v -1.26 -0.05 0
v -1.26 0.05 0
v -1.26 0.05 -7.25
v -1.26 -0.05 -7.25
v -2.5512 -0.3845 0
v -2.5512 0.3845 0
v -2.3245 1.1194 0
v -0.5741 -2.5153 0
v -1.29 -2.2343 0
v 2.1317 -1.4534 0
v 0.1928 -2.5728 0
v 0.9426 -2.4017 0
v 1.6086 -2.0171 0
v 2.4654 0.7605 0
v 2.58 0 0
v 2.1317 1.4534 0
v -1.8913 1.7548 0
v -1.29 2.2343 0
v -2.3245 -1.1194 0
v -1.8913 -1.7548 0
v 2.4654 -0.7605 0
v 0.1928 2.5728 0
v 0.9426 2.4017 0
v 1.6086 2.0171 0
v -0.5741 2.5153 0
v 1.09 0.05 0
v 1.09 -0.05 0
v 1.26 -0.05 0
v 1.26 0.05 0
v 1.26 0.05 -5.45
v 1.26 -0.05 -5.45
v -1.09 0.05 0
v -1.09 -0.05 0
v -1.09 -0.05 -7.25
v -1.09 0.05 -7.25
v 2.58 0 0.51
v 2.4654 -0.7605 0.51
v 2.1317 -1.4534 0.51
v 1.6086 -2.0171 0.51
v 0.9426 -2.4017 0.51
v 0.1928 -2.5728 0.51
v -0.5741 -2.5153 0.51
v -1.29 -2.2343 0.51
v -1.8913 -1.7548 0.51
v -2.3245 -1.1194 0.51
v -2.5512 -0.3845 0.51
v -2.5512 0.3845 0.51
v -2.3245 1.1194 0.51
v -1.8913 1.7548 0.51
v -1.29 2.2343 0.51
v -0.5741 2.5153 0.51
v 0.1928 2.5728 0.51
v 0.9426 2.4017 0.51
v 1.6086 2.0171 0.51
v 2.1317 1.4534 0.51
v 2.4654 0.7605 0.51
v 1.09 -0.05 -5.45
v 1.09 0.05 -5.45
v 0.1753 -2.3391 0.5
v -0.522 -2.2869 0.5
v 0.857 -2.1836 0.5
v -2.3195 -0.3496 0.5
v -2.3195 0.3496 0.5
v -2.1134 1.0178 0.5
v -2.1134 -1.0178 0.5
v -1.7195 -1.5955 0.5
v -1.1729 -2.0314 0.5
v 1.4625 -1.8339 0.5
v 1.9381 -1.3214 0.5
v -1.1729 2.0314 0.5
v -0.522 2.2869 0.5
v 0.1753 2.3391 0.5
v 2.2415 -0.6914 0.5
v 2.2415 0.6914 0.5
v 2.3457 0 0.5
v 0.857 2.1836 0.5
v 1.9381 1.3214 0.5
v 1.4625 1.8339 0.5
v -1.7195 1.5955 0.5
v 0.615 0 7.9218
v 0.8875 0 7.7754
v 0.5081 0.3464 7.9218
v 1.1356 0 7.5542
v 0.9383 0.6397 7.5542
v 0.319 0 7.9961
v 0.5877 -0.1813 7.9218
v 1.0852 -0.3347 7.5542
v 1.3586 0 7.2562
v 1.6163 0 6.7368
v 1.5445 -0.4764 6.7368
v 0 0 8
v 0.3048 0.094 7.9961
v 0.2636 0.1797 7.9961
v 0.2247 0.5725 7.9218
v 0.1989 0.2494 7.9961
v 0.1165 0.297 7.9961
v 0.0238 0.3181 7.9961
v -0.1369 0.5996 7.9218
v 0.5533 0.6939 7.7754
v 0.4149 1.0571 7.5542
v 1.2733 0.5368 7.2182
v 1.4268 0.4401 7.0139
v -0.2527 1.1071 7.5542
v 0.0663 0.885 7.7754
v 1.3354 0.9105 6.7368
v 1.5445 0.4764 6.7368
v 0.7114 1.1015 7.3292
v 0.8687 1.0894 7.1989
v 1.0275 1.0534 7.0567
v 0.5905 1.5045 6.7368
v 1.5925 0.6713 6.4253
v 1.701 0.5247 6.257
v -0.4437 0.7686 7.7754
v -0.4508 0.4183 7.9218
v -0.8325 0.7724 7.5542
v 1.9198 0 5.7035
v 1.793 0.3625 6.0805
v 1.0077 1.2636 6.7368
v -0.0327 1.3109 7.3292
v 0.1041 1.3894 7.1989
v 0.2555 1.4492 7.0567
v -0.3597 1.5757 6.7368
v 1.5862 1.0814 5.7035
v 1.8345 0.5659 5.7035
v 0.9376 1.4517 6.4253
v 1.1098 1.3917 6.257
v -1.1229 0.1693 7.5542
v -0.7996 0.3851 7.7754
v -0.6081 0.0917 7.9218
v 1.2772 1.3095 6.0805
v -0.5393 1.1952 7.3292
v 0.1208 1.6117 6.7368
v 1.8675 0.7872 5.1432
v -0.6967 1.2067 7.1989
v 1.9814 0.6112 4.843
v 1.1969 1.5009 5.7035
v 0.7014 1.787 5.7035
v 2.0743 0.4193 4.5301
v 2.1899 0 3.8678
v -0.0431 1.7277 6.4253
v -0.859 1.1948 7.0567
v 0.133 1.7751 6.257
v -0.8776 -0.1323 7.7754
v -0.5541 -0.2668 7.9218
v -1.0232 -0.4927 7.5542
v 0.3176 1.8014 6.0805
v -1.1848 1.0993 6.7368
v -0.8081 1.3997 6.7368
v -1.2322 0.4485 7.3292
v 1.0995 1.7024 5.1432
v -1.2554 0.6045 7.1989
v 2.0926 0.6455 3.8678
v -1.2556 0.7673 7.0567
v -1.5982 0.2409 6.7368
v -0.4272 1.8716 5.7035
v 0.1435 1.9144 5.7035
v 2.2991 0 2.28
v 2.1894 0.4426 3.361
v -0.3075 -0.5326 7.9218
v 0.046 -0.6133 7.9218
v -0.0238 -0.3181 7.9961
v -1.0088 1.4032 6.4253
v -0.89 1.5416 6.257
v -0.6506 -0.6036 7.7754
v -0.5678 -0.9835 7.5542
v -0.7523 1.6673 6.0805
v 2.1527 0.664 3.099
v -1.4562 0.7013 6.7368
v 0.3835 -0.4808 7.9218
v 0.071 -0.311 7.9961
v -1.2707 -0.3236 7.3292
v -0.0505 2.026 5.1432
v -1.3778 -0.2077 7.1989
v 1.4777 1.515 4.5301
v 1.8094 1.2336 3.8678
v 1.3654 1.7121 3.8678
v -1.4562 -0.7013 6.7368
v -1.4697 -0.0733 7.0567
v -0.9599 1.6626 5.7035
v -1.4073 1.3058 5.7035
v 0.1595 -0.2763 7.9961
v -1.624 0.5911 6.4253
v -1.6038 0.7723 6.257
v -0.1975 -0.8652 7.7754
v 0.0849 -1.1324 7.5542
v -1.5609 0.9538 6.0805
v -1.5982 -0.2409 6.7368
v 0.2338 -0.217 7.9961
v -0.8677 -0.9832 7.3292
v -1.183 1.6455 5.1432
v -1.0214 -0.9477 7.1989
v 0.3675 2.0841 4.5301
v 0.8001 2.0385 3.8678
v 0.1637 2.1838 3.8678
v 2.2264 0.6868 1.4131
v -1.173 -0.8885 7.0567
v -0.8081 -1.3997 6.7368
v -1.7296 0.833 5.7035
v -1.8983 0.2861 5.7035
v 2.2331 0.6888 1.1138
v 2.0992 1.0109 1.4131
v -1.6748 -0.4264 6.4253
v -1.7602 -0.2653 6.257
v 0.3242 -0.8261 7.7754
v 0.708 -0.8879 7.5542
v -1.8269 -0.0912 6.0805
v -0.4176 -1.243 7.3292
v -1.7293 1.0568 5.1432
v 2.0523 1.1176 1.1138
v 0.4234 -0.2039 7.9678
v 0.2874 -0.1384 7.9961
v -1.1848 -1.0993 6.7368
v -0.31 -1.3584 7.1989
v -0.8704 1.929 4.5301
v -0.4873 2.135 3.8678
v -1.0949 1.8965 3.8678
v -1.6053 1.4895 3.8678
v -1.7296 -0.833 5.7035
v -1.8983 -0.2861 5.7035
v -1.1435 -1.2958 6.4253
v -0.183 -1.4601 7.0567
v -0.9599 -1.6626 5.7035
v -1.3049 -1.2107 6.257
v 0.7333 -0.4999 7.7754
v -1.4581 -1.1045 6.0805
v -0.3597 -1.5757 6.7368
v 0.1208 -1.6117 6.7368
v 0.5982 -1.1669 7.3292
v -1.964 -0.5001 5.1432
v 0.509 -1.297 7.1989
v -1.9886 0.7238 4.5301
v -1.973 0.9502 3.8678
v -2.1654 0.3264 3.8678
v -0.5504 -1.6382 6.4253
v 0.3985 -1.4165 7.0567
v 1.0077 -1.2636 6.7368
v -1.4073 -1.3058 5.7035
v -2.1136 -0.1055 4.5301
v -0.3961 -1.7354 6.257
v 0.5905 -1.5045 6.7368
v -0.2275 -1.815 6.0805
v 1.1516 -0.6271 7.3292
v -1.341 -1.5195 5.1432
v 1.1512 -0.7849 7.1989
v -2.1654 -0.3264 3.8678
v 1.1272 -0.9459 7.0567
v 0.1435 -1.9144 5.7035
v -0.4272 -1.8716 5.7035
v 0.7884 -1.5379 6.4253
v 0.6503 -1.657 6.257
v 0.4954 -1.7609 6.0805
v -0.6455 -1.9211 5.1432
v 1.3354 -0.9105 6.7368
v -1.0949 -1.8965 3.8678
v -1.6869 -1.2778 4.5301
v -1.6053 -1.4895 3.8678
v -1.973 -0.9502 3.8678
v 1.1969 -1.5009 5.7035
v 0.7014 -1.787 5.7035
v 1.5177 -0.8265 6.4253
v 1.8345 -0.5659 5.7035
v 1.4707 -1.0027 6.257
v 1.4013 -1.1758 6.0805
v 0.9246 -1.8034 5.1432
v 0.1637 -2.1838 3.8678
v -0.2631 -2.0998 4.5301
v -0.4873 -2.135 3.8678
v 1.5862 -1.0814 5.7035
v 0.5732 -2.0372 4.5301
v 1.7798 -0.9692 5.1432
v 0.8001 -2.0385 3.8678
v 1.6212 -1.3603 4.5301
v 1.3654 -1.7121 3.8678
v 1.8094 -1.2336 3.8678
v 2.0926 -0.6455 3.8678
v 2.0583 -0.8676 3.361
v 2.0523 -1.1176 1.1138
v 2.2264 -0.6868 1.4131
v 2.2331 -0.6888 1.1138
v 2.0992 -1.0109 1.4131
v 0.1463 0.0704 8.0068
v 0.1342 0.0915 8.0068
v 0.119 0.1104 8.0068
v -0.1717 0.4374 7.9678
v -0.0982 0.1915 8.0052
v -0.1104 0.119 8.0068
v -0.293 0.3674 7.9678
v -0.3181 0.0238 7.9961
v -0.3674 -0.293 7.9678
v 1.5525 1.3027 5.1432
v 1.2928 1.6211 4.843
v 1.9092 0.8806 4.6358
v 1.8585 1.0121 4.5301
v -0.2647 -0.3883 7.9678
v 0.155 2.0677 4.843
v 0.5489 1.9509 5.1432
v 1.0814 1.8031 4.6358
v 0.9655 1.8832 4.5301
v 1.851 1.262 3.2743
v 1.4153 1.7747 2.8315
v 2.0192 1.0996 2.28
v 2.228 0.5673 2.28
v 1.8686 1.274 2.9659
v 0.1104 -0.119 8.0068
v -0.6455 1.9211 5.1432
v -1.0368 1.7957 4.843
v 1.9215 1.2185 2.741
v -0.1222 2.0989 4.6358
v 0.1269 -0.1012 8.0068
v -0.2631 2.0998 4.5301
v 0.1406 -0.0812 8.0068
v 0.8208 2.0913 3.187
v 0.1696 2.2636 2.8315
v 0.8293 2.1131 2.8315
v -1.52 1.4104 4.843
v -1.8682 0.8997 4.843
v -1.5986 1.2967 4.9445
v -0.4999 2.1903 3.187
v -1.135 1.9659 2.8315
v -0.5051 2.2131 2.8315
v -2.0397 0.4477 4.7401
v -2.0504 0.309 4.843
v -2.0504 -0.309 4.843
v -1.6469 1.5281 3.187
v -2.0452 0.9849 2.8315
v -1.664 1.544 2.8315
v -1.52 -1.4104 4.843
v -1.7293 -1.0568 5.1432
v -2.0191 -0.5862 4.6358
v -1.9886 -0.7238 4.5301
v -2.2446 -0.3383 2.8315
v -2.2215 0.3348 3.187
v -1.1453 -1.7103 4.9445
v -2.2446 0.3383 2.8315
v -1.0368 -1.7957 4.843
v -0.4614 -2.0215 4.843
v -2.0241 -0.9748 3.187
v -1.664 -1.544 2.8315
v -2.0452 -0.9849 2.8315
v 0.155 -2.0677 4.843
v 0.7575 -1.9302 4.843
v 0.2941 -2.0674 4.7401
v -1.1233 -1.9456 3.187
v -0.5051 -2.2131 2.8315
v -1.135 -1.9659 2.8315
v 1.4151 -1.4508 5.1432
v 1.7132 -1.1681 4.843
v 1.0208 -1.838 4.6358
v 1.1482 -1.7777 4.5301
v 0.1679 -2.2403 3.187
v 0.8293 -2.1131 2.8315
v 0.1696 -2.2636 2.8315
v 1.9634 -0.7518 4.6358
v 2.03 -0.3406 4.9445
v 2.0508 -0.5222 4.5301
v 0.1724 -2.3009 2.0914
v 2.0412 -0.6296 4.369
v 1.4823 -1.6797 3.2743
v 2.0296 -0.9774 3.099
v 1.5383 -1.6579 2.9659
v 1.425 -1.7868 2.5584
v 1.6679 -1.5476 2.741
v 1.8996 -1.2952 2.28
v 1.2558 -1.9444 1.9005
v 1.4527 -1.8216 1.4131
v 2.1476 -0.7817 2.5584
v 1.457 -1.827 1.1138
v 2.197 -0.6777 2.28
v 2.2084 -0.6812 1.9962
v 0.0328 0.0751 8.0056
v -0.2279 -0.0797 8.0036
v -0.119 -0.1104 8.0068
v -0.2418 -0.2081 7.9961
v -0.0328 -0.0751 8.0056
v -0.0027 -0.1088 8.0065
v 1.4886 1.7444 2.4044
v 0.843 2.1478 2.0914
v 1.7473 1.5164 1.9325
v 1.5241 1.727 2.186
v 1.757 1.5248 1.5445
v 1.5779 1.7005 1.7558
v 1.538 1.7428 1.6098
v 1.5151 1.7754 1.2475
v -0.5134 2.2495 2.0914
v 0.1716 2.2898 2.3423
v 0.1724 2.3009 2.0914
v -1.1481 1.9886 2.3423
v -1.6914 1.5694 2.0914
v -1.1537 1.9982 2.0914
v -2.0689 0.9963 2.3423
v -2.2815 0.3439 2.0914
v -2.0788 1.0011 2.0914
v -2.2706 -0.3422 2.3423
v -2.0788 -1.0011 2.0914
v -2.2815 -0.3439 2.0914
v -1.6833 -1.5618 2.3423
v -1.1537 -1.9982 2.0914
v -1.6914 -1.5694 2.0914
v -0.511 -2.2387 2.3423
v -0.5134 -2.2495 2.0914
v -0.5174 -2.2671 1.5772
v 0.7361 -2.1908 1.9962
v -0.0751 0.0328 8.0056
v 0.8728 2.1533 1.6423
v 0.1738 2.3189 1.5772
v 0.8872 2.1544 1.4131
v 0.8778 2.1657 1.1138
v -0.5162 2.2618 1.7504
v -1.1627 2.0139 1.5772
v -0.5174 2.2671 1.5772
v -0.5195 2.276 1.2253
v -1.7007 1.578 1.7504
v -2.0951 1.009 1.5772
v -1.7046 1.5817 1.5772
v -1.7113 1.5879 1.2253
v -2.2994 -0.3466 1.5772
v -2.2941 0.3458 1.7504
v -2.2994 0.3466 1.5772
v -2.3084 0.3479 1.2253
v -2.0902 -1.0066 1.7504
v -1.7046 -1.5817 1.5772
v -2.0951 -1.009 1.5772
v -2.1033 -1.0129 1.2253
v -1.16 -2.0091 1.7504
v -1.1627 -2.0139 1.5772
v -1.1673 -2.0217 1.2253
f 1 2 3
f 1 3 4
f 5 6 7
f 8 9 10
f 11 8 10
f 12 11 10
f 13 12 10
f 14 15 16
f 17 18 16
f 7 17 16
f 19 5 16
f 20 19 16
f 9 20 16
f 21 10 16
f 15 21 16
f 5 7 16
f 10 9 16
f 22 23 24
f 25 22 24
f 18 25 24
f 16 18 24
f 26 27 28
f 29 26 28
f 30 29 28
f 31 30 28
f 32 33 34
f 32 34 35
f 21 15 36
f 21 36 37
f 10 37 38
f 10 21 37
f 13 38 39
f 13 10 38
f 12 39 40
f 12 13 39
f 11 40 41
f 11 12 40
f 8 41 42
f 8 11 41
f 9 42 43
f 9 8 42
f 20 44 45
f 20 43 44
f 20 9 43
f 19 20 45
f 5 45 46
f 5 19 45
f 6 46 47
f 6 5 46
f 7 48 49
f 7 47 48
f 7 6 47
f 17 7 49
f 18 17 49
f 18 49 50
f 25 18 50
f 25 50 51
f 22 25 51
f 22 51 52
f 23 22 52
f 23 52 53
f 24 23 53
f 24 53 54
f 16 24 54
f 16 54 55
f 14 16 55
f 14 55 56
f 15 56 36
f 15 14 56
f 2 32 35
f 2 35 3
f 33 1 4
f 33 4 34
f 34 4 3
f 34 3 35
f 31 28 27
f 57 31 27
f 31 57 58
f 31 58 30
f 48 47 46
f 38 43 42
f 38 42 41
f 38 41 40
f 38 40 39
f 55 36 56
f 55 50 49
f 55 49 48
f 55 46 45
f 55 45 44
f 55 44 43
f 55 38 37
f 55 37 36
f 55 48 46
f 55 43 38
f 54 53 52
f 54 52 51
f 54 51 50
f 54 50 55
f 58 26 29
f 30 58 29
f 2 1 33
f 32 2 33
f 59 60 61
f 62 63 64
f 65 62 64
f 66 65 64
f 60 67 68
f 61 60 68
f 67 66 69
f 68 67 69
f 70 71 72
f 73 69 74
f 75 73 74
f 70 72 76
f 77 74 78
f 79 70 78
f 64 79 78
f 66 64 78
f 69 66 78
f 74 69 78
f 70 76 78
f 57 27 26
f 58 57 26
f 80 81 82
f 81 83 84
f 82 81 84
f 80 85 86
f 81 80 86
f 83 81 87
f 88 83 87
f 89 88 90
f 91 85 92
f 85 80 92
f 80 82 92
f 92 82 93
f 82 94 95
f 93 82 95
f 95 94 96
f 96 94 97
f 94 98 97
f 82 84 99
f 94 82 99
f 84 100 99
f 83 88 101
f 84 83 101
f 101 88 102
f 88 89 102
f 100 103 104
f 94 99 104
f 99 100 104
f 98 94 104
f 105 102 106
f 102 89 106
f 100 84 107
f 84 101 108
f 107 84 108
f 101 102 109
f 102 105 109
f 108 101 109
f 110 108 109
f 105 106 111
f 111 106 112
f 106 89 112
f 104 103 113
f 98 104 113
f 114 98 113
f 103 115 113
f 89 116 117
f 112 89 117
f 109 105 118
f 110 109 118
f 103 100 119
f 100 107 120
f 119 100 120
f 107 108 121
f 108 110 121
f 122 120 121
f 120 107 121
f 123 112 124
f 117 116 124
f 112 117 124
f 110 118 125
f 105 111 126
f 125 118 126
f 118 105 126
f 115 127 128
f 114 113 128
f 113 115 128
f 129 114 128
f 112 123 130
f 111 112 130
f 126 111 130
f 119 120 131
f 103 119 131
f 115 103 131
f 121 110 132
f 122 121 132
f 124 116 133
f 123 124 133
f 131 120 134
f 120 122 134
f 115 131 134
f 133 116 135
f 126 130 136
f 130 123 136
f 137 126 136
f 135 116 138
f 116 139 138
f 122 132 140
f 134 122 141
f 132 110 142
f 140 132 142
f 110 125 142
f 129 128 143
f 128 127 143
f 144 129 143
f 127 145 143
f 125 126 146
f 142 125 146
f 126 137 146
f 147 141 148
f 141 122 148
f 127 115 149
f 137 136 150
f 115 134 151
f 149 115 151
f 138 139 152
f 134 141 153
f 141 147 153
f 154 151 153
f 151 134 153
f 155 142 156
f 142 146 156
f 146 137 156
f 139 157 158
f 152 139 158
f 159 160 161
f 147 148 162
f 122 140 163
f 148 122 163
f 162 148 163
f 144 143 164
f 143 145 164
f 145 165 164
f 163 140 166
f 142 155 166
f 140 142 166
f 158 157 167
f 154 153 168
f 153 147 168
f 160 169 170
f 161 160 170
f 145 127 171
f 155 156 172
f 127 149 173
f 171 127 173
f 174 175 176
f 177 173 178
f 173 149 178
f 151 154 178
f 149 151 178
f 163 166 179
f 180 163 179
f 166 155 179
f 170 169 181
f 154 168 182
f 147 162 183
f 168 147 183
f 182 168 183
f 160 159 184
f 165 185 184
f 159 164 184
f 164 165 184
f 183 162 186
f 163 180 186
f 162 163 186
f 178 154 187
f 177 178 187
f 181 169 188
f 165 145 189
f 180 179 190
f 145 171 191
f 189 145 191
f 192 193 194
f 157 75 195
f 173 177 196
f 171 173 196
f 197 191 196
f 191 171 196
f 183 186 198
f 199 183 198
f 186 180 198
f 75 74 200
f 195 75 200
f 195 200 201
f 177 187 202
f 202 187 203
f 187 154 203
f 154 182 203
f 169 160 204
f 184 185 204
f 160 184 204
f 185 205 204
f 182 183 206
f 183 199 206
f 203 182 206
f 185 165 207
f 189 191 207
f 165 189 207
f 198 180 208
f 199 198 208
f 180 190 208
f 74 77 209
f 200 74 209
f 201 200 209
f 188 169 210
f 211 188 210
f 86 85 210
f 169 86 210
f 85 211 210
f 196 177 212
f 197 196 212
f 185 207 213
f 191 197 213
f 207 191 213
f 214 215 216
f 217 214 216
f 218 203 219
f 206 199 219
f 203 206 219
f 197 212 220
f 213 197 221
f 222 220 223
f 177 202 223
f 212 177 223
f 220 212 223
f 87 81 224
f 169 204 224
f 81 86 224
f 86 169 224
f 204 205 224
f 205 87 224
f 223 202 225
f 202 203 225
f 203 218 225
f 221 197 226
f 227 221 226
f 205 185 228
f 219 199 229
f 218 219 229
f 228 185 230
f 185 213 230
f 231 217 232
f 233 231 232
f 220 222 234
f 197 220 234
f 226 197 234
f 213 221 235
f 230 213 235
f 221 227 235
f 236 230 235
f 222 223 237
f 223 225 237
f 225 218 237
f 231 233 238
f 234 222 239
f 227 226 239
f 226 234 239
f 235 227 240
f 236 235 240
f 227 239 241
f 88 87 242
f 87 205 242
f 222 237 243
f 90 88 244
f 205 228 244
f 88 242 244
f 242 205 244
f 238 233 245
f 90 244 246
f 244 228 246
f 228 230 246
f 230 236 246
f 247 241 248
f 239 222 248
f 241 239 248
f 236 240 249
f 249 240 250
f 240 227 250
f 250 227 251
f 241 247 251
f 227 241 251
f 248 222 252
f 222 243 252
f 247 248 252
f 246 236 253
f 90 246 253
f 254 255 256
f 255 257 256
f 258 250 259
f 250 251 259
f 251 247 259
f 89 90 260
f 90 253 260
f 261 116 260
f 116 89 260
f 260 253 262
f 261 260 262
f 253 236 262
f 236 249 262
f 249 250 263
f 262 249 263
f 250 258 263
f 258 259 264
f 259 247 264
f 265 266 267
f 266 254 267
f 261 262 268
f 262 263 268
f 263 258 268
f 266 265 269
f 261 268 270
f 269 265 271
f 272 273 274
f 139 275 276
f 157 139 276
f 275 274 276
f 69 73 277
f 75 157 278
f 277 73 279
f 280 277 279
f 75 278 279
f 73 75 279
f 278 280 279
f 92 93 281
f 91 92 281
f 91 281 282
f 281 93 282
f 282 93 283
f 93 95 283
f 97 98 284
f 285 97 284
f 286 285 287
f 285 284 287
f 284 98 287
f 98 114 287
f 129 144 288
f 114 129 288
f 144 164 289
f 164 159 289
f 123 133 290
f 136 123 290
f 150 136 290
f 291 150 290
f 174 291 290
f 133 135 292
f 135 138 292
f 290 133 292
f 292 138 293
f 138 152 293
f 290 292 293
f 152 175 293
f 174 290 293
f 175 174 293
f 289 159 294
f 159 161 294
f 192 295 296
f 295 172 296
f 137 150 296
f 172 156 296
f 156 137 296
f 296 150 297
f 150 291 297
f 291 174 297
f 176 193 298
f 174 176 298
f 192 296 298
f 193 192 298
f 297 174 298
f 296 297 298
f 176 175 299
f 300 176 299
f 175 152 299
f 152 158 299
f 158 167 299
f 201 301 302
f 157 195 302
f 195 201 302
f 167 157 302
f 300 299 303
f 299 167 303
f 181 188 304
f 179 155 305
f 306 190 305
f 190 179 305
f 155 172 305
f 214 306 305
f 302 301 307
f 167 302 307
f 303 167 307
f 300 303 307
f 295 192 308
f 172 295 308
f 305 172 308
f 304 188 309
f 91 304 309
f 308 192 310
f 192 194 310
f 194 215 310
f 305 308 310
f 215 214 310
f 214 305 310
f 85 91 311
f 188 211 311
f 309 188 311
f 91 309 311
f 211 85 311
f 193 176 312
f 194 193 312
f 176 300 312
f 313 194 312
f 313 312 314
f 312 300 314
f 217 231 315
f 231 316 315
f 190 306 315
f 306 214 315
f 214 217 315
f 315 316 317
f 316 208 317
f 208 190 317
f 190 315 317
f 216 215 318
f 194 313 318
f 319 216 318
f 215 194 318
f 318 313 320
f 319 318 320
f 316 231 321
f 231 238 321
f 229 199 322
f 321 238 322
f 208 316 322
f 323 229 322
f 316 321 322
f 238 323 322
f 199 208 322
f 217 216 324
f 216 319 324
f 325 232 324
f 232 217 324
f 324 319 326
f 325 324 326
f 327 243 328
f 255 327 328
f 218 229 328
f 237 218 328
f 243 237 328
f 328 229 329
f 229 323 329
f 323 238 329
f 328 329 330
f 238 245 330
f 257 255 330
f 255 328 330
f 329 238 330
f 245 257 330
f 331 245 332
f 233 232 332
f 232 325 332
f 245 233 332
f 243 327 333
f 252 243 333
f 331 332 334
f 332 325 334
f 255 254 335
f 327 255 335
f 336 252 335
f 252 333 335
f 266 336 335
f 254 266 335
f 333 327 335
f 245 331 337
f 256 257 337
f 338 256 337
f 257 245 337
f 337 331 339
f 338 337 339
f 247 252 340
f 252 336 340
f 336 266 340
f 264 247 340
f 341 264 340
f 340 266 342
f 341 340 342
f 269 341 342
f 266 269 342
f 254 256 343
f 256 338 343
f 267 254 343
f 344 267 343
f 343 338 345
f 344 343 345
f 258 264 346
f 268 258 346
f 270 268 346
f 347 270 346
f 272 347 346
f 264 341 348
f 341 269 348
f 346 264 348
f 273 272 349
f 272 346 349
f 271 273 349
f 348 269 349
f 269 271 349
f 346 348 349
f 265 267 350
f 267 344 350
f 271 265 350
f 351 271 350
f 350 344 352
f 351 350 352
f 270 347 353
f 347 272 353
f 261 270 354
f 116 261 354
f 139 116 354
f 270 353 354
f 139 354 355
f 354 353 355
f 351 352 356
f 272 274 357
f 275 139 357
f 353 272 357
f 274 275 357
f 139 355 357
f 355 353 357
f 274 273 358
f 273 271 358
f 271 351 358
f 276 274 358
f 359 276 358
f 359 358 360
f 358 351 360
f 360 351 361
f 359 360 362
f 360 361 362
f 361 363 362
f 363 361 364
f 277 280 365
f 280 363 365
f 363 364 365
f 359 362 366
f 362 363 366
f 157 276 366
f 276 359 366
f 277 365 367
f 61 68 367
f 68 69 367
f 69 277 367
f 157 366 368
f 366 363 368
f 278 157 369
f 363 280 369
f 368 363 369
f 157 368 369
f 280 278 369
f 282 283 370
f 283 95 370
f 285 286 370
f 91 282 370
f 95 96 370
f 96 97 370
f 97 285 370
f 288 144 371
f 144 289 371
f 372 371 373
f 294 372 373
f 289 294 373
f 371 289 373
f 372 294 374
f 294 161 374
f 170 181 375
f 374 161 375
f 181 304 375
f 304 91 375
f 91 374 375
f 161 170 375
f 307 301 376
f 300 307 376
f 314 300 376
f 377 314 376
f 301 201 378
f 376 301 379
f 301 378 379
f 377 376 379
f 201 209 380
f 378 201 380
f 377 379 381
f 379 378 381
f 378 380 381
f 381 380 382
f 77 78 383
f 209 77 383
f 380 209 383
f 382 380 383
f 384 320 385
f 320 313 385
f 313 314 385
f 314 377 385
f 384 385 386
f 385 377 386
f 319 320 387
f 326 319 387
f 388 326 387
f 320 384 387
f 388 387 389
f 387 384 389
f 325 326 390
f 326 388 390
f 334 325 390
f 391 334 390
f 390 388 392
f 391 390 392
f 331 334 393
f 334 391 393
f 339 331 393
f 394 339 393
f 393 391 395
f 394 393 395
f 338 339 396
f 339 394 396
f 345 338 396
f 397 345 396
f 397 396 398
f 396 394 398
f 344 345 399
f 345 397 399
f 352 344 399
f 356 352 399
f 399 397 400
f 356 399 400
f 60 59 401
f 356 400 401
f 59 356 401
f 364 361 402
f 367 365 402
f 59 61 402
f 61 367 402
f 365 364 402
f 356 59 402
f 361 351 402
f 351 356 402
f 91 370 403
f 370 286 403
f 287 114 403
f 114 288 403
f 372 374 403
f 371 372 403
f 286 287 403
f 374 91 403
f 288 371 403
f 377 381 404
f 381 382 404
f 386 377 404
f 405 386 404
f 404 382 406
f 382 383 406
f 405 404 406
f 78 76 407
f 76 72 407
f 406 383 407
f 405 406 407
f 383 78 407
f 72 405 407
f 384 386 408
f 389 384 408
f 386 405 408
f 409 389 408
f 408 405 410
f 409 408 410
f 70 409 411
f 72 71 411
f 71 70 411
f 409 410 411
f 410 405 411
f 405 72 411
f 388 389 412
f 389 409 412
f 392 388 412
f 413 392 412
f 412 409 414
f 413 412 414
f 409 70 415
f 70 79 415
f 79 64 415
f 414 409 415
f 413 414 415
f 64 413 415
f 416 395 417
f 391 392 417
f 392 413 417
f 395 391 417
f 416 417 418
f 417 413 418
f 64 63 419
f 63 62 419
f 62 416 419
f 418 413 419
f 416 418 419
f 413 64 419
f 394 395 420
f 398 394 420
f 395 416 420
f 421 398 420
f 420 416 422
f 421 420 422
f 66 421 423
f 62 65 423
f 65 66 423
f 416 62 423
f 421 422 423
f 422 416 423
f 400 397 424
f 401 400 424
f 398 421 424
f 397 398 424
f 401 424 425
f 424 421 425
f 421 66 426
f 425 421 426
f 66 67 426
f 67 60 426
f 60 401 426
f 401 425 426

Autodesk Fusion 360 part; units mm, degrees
sketch "Sketch1" plane through (0, 0, 0) normal (0, 1, 0) x (1, 0, 0)
  line L0 (0, 0) -> (0, -8.06)
  line L1 (0, 0) -> (0, -0.51)
  dimension "d1" = 8.06
  dimension "d2" = 0.51
sketch "Sketch2" plane through (0, 0, 0) normal (0, 0, 1) x (1, 0, 0)
  circle A0 centre (0, 0) radius 2.58
  dimension "d3" = 5.16
extrude "Extrude1" add sketch "Sketch2" along normal blind 0.51 makes body 1
sketch "Sketch3" plane through (0, 0, 0) normal (0, 1, 0) x (1, 0, 0)
sketch "Sketch4" plane through (0, 0, 0.51) normal (0, 0, 1) x (-1, 0, 0)
  circle A0 centre (0, 0) radius 2.58
  circle A1 centre (0, 0) radius 2.35
  dimension "d6" = 4.7
sketch "Sketch5" plane through (0, 0, 0) normal (0, 1, 0) x (1, 0, 0)
  line L0 (0, -0.5) -> (2.3457, -0.5)
  line L1 (0, -0.5) -> (0, -8)
  spline S0 degree 5 poles (0, -8) (0.0989, -8.0093) (0.2915, -8.0122) (0.5652, -7.9699) (0.8991, -7.8185) (1.2621, -7.4622) (1.5677, -6.9302) (1.8156, -6.2209) (2.0097, -5.347) (2.1557, -4.3254) (2.2592, -3.1732) (2.3114, -2.1579) (2.3346, -1.3476) (2.3432, -0.7861) (2.3457, -0.5) knots 0 0 0 0 0 0 0.1 0.2 0.3 0.4 0.5 0.6 0.7 0.8 0.9 1 1 1 1 1 1
  point P0 (1.5, -7)
revolve "Revolve1" add sketch "Sketch5" angle 360 about axis through (0, 0, 0) along (0, 0, 1) separate body makes body 2
sketch "Sketch6" plane through (0, 0, 0) normal (0, 0, -1) x (1, 0, 0)
  circle A0 centre (0, 0) radius 2.58
  circle A1 centre (0, 0) radius 2.35
  line L0 (0, 0) -> (0, 0.9) construction
  line L1 (-1.09, -0.05) -> (-1.26, -0.05)
  line L2 (-1.26, -0.05) -> (-1.26, 0.05)
  line L3 (-1.26, 0.05) -> (-1.09, 0.05)
  line L4 (-1.09, 0.05) -> (-1.09, -0.05)
  line L5 (-1.09, -0.05) -> (-1.26, 0.05) construction
  line L6 (-1.26, -0.05) -> (-1.09, 0.05) construction
  line L7 (1.09, 0.05) -> (1.09, -0.05)
  line L8 (1.26, 0.05) -> (1.09, 0.05)
  line L9 (1.26, -0.05) -> (1.26, 0.05)
  line L10 (1.09, -0.05) -> (1.26, -0.05)
  point P0 (-1.175, 0)
  dimension "d9" = 1.175
  dimension "d14" = 0.17
  dimension "d15" = 0.1
extrude "Extrude4" add sketch "Sketch6" along normal blind 5.45 separate body contours L7 L8 L9 L10 makes body 3
extrude "Extrude5" add sketch "Sketch6" along normal blind 7.25 separate body contours L1 L2 L3 L4 makes body 4
equation "d9 = ( 4.7 / 12 * 3 ) * 1 mm"
